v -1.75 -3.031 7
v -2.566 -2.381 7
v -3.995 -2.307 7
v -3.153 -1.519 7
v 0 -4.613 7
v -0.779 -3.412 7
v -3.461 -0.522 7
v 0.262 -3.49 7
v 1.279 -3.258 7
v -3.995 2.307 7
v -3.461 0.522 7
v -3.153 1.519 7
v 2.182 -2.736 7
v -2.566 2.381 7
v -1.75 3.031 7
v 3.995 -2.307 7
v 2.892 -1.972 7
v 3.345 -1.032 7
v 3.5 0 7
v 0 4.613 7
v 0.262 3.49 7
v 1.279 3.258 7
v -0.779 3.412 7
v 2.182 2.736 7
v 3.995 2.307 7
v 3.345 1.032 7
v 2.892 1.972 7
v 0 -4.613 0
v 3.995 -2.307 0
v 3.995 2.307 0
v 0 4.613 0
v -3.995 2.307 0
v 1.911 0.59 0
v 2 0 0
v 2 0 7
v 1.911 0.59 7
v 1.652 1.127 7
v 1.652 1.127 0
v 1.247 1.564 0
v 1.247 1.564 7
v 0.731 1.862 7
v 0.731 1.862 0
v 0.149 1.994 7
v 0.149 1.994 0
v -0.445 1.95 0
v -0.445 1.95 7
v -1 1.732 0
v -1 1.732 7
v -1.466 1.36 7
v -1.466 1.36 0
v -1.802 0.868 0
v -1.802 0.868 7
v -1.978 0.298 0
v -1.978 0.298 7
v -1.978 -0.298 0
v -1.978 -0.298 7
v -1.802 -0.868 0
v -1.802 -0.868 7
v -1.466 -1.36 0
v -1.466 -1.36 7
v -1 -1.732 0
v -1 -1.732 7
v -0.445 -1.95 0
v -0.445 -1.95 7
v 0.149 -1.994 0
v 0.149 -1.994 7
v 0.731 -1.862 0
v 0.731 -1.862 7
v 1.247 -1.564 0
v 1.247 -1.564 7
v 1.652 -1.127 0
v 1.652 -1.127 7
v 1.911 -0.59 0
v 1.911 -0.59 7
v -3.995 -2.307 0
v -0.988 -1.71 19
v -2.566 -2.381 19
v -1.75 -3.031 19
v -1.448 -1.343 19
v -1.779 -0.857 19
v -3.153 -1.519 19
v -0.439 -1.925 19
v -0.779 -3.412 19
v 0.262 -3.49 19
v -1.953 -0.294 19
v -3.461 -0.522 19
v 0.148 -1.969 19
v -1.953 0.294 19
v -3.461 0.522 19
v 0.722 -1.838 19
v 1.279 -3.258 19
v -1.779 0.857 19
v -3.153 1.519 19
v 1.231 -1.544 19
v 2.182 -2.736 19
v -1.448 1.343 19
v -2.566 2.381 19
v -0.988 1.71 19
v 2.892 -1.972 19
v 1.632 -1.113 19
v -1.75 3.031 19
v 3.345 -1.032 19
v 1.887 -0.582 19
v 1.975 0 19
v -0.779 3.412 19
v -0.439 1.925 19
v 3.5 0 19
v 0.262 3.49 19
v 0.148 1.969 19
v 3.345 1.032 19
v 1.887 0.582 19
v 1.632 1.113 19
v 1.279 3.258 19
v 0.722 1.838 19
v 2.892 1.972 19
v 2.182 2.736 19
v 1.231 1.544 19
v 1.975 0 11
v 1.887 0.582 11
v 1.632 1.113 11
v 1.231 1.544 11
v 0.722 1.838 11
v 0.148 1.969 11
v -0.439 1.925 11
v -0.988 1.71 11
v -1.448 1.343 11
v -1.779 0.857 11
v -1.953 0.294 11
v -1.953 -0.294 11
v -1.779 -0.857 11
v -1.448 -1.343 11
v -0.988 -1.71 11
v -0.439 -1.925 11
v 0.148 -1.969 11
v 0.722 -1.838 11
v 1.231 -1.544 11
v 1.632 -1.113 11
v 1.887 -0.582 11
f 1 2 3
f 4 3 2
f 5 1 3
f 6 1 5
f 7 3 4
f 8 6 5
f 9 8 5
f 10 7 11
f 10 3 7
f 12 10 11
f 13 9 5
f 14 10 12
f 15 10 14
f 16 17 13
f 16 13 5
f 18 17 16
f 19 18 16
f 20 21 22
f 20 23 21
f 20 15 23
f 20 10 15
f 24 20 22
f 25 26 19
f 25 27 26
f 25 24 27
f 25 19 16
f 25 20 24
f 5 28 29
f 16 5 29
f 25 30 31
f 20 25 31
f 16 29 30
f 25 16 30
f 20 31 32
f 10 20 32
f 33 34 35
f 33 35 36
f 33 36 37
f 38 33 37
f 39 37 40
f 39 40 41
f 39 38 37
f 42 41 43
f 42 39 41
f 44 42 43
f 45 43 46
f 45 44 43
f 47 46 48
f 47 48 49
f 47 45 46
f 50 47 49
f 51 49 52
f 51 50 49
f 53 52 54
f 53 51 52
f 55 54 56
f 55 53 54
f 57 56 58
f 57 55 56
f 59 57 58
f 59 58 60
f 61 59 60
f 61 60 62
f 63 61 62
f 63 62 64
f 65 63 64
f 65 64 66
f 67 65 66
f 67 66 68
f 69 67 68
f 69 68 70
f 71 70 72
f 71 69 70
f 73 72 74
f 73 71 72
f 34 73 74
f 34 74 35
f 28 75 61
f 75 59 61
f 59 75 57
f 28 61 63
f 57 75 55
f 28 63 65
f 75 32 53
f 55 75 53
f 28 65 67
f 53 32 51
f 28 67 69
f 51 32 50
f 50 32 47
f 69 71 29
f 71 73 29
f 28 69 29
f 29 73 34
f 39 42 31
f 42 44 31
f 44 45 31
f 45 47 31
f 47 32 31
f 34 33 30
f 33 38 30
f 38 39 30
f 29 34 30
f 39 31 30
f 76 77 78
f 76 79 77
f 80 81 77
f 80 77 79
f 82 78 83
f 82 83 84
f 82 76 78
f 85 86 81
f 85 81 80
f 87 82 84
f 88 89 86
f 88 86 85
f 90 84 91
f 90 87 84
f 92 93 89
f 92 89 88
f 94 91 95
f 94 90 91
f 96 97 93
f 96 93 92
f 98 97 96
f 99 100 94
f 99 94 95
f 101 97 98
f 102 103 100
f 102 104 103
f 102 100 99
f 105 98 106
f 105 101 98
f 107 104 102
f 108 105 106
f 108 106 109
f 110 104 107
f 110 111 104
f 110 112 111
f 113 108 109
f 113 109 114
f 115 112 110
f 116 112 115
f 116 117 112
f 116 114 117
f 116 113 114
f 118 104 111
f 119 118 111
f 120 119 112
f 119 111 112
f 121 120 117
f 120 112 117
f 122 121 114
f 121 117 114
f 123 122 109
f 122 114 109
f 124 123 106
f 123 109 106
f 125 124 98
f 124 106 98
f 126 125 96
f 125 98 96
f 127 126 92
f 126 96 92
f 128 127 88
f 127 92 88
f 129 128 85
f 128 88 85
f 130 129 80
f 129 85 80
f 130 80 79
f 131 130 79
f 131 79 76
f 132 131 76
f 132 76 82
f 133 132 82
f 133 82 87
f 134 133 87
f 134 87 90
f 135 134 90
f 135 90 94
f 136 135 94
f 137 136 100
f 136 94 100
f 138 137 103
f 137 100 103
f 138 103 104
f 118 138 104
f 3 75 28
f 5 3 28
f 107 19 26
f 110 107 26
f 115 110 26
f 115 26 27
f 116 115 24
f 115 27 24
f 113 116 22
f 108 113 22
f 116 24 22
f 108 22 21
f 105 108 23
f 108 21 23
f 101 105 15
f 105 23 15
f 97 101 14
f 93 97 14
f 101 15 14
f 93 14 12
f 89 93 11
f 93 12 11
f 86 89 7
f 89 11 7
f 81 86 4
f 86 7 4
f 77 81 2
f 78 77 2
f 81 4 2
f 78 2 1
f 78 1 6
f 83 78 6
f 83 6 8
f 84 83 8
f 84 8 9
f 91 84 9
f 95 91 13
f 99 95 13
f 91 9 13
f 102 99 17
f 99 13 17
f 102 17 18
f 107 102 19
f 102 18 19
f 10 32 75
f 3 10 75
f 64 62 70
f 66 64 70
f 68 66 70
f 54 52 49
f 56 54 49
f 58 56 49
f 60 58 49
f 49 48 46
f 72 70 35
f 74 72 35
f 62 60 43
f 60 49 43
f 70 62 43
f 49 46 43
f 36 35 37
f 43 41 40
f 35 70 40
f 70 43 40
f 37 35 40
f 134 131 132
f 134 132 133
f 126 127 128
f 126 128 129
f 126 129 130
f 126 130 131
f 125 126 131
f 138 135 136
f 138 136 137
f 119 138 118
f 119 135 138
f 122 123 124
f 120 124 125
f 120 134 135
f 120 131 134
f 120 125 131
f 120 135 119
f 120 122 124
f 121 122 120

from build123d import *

# Parameters (mm, degrees)
ESBO_O1_R                = 2
RESSALTO_EXTRUS_O1_DEPTH = 7
ESBO_O2_R                = 3.5
RESSALTO_EXTRUS_O2_DEPTH = 12
ESBO_O3_R                = 1.975
CORTE_EXTRUS_O1_DEPTH    = 8


with BuildPart() as part:
    # Esboço1 → Ressalto-extrusão1 (new body)
    with BuildSketch(Plane.XY):
        Polygon((0, 4.613028651), (-3.995, 2.306514325), (-3.995, -2.306514325), (0, -4.613028651), (3.995, -2.306514325), (3.995, 2.306514325), align=None)
        Circle(ESBO_O1_R, mode=Mode.SUBTRACT)
    extrude(amount=RESSALTO_EXTRUS_O1_DEPTH)

    # Esboço2 → Ressalto-extrusão2 (add)
    with BuildSketch(Plane.XY.offset(7)):
        Circle(ESBO_O2_R)
    extrude(amount=RESSALTO_EXTRUS_O2_DEPTH)

    # Esboço3 → Corte-extrusão1 (cut)
    with BuildSketch(Plane.XY.offset(19)):
        Circle(ESBO_O3_R)
    extrude(amount=-CORTE_EXTRUS_O1_DEPTH, mode=Mode.SUBTRACT)


solid = part.part
